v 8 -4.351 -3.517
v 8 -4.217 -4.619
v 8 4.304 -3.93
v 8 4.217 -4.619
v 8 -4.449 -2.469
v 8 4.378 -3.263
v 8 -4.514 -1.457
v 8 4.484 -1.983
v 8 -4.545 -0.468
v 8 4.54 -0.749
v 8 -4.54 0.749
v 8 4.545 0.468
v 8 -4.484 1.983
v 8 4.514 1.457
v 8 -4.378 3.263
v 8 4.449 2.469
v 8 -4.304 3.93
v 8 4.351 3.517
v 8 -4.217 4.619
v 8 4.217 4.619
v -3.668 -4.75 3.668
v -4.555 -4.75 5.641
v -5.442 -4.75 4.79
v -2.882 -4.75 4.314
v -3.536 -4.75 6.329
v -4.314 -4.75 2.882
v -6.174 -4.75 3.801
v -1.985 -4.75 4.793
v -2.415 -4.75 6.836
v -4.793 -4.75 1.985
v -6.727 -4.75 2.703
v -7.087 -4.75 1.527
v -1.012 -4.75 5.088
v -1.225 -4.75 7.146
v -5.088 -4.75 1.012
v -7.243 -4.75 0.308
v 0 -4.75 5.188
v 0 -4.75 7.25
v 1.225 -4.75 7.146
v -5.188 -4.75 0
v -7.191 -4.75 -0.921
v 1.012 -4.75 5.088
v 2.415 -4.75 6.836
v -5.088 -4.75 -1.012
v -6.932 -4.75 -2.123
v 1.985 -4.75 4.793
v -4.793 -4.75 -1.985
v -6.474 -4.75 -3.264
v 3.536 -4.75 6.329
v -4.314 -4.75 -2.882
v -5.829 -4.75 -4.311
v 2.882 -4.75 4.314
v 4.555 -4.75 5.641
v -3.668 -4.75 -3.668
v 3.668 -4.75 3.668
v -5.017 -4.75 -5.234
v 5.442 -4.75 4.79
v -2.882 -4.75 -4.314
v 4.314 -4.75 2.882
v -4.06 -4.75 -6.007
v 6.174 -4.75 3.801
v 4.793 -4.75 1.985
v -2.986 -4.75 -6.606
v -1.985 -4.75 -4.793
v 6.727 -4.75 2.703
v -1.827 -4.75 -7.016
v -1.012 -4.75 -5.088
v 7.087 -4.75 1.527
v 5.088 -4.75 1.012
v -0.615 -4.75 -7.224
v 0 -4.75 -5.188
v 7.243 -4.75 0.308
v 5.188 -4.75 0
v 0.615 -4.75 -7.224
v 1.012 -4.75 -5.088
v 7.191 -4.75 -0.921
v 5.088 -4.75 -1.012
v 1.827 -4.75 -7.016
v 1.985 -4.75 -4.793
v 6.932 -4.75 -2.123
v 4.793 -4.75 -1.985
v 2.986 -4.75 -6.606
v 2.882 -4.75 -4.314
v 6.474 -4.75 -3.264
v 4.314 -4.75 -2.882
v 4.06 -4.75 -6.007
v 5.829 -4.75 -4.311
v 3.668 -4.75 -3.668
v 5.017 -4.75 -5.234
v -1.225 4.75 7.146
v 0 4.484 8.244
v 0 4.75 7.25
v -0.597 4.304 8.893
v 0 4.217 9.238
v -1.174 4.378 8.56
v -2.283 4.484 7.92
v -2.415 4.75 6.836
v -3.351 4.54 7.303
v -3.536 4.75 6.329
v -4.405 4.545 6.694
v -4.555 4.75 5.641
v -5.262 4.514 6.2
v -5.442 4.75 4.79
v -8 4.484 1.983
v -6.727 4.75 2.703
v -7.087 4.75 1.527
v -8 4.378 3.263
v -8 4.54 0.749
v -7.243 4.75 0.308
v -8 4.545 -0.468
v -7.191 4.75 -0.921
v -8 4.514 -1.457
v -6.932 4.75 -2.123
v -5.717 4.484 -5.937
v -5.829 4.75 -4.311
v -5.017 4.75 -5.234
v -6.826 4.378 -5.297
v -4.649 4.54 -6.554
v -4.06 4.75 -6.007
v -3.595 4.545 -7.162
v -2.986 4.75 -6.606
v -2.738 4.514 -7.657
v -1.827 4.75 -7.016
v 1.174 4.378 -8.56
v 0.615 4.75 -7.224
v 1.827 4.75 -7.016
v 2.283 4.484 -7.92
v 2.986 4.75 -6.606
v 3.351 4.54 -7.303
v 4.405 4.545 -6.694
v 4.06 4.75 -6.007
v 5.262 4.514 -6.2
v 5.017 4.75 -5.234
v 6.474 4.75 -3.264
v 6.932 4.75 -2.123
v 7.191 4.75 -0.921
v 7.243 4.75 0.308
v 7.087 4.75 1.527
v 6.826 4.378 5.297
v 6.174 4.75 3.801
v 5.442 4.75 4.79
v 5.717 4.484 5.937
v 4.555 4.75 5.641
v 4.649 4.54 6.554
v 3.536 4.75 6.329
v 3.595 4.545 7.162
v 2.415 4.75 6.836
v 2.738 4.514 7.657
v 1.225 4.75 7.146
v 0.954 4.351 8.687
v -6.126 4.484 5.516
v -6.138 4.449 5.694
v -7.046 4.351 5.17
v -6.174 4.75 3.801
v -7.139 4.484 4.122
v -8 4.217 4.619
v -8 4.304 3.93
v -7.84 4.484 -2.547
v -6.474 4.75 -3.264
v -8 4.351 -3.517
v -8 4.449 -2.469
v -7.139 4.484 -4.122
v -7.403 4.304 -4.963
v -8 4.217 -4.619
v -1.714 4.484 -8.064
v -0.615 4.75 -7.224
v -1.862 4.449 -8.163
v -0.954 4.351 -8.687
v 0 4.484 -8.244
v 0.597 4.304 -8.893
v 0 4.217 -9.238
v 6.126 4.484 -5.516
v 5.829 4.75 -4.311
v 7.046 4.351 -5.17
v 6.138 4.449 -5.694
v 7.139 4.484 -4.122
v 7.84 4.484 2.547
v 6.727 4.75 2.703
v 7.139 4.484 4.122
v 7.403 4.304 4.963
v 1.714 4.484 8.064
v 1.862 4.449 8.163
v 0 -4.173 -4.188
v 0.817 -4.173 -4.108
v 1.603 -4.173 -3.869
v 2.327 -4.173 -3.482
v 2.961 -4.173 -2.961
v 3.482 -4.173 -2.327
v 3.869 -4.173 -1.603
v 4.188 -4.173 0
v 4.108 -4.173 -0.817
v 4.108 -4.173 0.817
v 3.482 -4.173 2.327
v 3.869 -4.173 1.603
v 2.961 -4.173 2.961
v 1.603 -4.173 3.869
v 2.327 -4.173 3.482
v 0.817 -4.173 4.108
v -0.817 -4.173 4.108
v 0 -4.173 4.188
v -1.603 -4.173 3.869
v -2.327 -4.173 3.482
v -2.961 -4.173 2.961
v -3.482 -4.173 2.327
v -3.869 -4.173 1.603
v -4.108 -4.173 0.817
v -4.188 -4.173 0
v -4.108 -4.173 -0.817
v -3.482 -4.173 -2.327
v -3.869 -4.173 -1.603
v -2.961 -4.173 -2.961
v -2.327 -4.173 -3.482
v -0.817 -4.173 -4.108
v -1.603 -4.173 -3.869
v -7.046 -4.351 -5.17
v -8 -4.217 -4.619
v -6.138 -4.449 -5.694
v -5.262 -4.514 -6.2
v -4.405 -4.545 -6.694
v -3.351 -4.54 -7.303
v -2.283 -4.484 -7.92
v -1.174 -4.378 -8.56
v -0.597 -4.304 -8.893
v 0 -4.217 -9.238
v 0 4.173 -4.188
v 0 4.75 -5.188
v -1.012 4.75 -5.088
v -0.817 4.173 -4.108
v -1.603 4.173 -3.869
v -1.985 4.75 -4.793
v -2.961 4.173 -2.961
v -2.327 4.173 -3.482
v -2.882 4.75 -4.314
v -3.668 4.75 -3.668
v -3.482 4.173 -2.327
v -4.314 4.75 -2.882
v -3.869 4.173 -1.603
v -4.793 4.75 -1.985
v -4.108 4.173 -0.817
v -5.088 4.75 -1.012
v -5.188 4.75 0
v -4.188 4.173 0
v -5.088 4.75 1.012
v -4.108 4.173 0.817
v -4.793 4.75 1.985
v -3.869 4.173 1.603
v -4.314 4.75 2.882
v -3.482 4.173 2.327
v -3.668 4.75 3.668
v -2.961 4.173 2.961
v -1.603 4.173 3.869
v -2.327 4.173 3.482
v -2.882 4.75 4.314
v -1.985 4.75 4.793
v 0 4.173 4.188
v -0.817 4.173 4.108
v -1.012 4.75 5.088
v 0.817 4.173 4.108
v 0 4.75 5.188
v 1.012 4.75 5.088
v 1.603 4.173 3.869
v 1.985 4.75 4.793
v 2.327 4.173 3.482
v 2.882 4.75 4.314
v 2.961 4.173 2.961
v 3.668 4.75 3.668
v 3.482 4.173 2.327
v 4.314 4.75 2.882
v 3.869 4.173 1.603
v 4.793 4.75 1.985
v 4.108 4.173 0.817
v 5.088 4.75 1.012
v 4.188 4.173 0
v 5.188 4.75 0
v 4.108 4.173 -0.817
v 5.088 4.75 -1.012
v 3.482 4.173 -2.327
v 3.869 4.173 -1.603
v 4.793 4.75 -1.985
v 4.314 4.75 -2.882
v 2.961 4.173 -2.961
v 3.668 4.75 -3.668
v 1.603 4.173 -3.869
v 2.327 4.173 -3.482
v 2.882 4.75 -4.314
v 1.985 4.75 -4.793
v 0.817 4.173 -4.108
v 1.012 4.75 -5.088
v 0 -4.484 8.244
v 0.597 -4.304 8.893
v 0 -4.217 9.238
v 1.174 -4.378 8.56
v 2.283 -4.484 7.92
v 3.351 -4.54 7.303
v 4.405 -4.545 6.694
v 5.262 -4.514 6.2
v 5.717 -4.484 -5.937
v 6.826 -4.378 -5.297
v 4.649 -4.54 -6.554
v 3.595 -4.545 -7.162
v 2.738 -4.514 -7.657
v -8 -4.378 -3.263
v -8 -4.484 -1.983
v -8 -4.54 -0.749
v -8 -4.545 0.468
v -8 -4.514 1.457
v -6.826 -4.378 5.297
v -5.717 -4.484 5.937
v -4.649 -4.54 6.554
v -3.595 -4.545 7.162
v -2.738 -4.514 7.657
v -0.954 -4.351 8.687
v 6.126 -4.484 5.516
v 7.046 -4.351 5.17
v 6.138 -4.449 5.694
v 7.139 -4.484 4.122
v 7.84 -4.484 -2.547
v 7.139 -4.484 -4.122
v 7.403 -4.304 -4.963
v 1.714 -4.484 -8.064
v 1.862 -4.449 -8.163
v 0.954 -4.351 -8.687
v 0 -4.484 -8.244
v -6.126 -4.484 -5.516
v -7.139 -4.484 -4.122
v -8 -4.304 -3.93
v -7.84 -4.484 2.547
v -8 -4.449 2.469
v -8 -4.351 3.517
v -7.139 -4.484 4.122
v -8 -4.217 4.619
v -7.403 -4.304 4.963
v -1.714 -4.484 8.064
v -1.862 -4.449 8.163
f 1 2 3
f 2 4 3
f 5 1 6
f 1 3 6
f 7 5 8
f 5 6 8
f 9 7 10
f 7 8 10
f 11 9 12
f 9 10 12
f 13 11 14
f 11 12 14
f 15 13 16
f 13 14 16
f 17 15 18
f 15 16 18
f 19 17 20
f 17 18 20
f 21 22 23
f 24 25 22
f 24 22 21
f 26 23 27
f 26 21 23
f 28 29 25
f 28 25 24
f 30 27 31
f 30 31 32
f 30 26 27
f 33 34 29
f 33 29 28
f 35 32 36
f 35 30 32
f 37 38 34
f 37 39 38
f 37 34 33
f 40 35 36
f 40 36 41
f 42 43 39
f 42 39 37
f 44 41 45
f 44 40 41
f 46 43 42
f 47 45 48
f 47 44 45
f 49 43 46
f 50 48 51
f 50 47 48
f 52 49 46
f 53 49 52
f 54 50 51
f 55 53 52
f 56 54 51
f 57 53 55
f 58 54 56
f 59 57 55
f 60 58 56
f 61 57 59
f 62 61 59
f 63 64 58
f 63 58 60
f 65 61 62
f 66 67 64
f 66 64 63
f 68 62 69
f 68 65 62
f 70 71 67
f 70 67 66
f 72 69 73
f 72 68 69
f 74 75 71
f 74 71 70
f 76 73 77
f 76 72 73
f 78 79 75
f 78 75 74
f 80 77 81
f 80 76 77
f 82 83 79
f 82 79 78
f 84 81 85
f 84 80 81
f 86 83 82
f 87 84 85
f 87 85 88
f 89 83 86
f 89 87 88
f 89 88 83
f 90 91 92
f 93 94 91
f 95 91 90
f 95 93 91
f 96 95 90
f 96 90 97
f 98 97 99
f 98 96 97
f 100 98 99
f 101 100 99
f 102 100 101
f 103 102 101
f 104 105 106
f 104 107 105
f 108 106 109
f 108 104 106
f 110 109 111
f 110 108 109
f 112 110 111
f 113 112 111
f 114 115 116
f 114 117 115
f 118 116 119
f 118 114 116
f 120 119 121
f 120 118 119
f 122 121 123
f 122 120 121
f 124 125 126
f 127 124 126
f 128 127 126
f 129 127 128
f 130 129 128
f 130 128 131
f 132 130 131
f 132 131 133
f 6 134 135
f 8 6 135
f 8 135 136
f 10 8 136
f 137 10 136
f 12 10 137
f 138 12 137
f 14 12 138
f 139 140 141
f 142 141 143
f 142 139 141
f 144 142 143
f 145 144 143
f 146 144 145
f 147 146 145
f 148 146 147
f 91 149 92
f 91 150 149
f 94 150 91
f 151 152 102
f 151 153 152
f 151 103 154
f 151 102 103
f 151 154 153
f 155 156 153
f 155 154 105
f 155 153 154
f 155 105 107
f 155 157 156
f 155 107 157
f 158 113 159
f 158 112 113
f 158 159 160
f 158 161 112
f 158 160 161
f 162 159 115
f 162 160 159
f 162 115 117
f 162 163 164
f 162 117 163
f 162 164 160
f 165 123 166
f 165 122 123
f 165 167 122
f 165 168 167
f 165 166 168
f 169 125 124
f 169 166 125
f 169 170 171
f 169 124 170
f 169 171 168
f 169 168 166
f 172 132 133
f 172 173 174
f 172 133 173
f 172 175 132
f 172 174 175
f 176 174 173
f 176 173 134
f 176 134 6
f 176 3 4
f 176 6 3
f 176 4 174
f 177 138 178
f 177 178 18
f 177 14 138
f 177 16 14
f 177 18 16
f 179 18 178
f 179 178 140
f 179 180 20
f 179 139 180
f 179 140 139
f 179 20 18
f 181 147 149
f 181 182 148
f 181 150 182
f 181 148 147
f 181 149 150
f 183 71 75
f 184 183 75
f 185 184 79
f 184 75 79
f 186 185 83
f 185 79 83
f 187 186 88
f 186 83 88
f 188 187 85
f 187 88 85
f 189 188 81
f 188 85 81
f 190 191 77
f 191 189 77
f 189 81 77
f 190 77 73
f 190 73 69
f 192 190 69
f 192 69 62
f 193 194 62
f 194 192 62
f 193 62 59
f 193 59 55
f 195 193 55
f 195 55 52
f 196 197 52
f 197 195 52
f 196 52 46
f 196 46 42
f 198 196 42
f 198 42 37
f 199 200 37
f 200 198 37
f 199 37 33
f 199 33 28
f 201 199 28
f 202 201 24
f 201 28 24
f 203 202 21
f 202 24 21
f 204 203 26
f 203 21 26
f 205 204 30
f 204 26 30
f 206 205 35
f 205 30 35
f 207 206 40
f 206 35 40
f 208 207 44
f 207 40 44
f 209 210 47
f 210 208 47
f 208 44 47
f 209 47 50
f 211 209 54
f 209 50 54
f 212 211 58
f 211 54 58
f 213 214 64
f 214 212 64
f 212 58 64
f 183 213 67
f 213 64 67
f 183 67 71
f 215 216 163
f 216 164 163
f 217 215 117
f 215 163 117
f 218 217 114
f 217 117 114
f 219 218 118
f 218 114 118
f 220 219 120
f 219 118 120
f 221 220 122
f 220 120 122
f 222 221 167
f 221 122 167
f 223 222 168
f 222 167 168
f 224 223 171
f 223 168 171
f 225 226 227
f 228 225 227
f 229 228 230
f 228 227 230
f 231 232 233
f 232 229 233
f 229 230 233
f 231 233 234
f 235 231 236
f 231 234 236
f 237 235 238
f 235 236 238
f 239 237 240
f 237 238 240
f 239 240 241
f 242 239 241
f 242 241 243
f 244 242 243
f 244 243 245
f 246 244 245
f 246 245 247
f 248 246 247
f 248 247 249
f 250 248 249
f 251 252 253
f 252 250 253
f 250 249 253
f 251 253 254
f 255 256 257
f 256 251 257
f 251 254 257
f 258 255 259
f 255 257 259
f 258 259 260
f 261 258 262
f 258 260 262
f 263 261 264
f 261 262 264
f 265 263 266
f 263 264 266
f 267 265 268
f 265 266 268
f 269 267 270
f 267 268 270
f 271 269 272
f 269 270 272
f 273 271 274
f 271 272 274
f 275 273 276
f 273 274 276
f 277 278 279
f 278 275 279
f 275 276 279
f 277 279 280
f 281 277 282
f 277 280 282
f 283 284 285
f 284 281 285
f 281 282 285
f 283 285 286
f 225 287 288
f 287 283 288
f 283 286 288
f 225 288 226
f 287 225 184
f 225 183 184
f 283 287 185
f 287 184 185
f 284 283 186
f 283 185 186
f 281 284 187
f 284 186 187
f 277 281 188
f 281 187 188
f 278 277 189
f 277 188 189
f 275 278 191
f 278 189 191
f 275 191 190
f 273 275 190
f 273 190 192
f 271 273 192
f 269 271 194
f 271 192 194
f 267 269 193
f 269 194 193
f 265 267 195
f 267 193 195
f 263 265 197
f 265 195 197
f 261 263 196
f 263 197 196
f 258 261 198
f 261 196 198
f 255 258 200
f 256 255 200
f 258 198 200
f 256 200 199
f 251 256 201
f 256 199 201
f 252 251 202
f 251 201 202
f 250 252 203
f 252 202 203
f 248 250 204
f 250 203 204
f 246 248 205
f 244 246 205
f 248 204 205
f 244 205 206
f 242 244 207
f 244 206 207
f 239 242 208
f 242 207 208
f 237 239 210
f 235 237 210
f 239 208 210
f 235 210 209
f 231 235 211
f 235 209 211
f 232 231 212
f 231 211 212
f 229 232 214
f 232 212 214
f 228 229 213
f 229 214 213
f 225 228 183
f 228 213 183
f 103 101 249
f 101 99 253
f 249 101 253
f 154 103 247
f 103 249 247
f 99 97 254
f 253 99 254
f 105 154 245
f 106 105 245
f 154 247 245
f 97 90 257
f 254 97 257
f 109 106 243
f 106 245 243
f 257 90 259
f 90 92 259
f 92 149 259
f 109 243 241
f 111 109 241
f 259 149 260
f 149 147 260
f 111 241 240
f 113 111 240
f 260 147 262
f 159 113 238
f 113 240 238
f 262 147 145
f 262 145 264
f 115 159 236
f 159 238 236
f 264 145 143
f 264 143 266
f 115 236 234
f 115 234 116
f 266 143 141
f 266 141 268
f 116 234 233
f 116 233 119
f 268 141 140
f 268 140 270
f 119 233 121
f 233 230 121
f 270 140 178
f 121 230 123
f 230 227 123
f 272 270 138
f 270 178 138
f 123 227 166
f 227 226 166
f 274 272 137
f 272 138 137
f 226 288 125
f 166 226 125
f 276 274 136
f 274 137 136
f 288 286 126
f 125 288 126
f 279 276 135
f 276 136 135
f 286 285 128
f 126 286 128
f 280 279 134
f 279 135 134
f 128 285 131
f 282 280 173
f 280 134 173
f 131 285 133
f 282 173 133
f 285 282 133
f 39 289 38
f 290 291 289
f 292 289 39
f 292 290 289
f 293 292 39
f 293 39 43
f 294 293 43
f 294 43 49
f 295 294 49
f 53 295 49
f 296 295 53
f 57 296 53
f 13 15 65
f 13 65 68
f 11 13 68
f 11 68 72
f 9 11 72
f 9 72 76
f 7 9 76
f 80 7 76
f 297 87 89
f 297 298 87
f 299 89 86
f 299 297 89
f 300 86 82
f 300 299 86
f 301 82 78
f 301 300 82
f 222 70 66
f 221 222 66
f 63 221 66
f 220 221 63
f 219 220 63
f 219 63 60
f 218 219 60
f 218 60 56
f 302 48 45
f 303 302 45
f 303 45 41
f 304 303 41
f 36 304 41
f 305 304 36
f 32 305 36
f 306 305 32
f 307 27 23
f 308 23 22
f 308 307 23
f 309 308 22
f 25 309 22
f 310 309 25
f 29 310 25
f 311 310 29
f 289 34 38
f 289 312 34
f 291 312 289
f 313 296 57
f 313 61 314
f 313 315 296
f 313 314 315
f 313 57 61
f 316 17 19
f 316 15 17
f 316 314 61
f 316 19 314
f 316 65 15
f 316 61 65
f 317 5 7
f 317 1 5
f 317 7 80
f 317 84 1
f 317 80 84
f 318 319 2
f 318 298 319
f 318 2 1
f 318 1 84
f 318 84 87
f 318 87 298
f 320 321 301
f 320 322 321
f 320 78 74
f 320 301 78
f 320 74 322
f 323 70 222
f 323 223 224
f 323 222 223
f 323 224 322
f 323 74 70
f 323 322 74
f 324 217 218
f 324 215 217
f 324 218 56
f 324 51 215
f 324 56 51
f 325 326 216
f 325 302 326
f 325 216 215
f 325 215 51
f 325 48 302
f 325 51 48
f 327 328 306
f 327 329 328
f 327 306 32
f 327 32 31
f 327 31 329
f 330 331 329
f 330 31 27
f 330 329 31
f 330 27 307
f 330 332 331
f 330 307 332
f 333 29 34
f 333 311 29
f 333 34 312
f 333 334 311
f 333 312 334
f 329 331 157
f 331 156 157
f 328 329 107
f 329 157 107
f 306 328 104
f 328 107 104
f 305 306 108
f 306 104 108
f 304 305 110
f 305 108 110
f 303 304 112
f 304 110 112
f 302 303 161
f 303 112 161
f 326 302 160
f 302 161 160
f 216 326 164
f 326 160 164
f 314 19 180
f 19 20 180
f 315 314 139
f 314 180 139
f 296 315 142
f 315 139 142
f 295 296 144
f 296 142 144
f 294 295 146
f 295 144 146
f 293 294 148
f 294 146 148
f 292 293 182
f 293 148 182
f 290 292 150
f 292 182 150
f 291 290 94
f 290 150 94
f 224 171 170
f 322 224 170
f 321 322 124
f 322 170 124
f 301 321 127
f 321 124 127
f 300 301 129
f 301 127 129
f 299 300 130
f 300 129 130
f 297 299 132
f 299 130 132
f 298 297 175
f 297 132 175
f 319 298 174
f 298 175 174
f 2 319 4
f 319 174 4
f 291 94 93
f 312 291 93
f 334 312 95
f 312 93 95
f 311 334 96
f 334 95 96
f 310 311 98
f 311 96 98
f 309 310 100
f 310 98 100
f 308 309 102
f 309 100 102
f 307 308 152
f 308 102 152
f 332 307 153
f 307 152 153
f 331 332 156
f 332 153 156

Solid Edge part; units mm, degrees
sketch "Sketch1" plane through (0, 0, 0) normal (0, -1, 0) x (1, 0, 0)
  line L0 (8, 4.6188) -> (0, 9.2376)
  line L1 (0, 9.2376) -> (-8, 4.6188)
  line L2 (-8, 4.6188) -> (-8, -4.6188)
  line L3 (-8, -4.6188) -> (0, -9.2376)
  line L4 (0, -9.2376) -> (8, -4.6188)
  line L5 (8, -4.6188) -> (8, 4.6188)
extrude "Protrusion1" add sketch "Sketch1" along normal mid plane 9.5
sketch "Sketch2" plane through (0, 0, 0) normal (1, 0, 0) x (0, 1, 0)
  line L0 (-4.75, 7.25) -> (-4.2174, 9.2376)
revolve "RevolvedCutout1" cut sketch "Sketch2" angle 360 about axis through (0, 0, 0) along (0, -1, 0) material side at (0, -4.532, 8.2567)
mirror "Mirror1" about plane through (0, 0, 0) normal (0, -1, 0) of "RevolvedCutout1"
hole "孔_7" at (0, -4.75, 0) direction (0, 1, 0) diameter 8.376 end up to next start chamfer 1 start chamfer angle 60 end chamfer 1 end chamfer angle 60
